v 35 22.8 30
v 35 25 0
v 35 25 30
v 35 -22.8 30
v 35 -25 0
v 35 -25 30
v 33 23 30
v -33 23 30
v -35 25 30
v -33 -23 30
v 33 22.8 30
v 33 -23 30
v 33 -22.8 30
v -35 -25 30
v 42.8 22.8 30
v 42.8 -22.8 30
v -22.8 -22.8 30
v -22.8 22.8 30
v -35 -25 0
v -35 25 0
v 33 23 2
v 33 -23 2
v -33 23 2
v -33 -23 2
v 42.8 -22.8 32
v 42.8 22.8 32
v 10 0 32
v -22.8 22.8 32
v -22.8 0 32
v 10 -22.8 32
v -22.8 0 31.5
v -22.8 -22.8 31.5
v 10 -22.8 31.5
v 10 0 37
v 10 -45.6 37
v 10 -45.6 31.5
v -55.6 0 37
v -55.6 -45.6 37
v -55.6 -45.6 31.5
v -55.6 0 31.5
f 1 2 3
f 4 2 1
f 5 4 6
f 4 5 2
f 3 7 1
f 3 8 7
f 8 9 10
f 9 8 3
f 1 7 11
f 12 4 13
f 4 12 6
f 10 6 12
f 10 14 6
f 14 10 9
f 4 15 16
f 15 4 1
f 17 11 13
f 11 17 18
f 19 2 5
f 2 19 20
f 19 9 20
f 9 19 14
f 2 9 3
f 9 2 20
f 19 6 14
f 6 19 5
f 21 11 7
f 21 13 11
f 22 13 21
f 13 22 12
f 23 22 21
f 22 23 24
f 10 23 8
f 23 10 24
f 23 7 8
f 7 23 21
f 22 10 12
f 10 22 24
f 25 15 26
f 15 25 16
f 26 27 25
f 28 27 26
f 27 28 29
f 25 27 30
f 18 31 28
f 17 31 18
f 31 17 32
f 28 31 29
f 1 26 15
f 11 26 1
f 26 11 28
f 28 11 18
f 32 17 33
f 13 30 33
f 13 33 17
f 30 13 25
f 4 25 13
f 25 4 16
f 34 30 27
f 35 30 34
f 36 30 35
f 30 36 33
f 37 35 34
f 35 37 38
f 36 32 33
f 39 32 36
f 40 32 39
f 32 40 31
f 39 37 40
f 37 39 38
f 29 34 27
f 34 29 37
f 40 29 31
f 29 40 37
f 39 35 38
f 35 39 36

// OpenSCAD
// Two-part enclosure for small electronics board
// Print orientation: box standing on bed, lid upside down (plate on bed)

$fn = 64;

// ---- Box ----
box_x = 70;      // outer length (X)
box_y = 50;      // outer width (Y)
box_z = 30;      // outer height (Z)
wall = 2;        // side wall thickness
floor = 2;       // floor thickness

// ---- Lid ----
lip_w = 65.6;    // lip outer length (X)
lip_d = 45.6;    // lip outer width (Y)
lip_h = 1.5;     // lip height (wall thickness)
lip_t = 4;       // lip top thickness

// ---- Misc ----
eps = 0.5;       // cutter overshoot
gap = 10;        // gap between parts on bed

// Derived
inner_x = box_x - 2*wall;
inner_y = box_y - 2*wall;
lip_total_h = lip_h + lip_t;   // from plate top to lip top

module box() {
    difference() {
        translate([-box_x/2, -box_y/2, 0])
            cube([box_x, box_y, box_z]);
        // open-top cavity
        translate([-inner_x/2, -inner_y/2, floor])
            cube([inner_x, inner_y, box_z - floor + eps]);
    }
}

module lid() {
    translate([gap - lip_w/2, -lip_d/2, 0]) {
        // plate
        cube([lip_w, lip_d, 2]);
        // lip (overlaps plate slightly -> one solid)
        translate([-lip_w/2, -lip_d/2, 2 - eps])
            cube([lip_w, lip_d, lip_total_h]);
    }
}

union() {
    box();
    translate([0, 0, box_z])
        lid();
}
